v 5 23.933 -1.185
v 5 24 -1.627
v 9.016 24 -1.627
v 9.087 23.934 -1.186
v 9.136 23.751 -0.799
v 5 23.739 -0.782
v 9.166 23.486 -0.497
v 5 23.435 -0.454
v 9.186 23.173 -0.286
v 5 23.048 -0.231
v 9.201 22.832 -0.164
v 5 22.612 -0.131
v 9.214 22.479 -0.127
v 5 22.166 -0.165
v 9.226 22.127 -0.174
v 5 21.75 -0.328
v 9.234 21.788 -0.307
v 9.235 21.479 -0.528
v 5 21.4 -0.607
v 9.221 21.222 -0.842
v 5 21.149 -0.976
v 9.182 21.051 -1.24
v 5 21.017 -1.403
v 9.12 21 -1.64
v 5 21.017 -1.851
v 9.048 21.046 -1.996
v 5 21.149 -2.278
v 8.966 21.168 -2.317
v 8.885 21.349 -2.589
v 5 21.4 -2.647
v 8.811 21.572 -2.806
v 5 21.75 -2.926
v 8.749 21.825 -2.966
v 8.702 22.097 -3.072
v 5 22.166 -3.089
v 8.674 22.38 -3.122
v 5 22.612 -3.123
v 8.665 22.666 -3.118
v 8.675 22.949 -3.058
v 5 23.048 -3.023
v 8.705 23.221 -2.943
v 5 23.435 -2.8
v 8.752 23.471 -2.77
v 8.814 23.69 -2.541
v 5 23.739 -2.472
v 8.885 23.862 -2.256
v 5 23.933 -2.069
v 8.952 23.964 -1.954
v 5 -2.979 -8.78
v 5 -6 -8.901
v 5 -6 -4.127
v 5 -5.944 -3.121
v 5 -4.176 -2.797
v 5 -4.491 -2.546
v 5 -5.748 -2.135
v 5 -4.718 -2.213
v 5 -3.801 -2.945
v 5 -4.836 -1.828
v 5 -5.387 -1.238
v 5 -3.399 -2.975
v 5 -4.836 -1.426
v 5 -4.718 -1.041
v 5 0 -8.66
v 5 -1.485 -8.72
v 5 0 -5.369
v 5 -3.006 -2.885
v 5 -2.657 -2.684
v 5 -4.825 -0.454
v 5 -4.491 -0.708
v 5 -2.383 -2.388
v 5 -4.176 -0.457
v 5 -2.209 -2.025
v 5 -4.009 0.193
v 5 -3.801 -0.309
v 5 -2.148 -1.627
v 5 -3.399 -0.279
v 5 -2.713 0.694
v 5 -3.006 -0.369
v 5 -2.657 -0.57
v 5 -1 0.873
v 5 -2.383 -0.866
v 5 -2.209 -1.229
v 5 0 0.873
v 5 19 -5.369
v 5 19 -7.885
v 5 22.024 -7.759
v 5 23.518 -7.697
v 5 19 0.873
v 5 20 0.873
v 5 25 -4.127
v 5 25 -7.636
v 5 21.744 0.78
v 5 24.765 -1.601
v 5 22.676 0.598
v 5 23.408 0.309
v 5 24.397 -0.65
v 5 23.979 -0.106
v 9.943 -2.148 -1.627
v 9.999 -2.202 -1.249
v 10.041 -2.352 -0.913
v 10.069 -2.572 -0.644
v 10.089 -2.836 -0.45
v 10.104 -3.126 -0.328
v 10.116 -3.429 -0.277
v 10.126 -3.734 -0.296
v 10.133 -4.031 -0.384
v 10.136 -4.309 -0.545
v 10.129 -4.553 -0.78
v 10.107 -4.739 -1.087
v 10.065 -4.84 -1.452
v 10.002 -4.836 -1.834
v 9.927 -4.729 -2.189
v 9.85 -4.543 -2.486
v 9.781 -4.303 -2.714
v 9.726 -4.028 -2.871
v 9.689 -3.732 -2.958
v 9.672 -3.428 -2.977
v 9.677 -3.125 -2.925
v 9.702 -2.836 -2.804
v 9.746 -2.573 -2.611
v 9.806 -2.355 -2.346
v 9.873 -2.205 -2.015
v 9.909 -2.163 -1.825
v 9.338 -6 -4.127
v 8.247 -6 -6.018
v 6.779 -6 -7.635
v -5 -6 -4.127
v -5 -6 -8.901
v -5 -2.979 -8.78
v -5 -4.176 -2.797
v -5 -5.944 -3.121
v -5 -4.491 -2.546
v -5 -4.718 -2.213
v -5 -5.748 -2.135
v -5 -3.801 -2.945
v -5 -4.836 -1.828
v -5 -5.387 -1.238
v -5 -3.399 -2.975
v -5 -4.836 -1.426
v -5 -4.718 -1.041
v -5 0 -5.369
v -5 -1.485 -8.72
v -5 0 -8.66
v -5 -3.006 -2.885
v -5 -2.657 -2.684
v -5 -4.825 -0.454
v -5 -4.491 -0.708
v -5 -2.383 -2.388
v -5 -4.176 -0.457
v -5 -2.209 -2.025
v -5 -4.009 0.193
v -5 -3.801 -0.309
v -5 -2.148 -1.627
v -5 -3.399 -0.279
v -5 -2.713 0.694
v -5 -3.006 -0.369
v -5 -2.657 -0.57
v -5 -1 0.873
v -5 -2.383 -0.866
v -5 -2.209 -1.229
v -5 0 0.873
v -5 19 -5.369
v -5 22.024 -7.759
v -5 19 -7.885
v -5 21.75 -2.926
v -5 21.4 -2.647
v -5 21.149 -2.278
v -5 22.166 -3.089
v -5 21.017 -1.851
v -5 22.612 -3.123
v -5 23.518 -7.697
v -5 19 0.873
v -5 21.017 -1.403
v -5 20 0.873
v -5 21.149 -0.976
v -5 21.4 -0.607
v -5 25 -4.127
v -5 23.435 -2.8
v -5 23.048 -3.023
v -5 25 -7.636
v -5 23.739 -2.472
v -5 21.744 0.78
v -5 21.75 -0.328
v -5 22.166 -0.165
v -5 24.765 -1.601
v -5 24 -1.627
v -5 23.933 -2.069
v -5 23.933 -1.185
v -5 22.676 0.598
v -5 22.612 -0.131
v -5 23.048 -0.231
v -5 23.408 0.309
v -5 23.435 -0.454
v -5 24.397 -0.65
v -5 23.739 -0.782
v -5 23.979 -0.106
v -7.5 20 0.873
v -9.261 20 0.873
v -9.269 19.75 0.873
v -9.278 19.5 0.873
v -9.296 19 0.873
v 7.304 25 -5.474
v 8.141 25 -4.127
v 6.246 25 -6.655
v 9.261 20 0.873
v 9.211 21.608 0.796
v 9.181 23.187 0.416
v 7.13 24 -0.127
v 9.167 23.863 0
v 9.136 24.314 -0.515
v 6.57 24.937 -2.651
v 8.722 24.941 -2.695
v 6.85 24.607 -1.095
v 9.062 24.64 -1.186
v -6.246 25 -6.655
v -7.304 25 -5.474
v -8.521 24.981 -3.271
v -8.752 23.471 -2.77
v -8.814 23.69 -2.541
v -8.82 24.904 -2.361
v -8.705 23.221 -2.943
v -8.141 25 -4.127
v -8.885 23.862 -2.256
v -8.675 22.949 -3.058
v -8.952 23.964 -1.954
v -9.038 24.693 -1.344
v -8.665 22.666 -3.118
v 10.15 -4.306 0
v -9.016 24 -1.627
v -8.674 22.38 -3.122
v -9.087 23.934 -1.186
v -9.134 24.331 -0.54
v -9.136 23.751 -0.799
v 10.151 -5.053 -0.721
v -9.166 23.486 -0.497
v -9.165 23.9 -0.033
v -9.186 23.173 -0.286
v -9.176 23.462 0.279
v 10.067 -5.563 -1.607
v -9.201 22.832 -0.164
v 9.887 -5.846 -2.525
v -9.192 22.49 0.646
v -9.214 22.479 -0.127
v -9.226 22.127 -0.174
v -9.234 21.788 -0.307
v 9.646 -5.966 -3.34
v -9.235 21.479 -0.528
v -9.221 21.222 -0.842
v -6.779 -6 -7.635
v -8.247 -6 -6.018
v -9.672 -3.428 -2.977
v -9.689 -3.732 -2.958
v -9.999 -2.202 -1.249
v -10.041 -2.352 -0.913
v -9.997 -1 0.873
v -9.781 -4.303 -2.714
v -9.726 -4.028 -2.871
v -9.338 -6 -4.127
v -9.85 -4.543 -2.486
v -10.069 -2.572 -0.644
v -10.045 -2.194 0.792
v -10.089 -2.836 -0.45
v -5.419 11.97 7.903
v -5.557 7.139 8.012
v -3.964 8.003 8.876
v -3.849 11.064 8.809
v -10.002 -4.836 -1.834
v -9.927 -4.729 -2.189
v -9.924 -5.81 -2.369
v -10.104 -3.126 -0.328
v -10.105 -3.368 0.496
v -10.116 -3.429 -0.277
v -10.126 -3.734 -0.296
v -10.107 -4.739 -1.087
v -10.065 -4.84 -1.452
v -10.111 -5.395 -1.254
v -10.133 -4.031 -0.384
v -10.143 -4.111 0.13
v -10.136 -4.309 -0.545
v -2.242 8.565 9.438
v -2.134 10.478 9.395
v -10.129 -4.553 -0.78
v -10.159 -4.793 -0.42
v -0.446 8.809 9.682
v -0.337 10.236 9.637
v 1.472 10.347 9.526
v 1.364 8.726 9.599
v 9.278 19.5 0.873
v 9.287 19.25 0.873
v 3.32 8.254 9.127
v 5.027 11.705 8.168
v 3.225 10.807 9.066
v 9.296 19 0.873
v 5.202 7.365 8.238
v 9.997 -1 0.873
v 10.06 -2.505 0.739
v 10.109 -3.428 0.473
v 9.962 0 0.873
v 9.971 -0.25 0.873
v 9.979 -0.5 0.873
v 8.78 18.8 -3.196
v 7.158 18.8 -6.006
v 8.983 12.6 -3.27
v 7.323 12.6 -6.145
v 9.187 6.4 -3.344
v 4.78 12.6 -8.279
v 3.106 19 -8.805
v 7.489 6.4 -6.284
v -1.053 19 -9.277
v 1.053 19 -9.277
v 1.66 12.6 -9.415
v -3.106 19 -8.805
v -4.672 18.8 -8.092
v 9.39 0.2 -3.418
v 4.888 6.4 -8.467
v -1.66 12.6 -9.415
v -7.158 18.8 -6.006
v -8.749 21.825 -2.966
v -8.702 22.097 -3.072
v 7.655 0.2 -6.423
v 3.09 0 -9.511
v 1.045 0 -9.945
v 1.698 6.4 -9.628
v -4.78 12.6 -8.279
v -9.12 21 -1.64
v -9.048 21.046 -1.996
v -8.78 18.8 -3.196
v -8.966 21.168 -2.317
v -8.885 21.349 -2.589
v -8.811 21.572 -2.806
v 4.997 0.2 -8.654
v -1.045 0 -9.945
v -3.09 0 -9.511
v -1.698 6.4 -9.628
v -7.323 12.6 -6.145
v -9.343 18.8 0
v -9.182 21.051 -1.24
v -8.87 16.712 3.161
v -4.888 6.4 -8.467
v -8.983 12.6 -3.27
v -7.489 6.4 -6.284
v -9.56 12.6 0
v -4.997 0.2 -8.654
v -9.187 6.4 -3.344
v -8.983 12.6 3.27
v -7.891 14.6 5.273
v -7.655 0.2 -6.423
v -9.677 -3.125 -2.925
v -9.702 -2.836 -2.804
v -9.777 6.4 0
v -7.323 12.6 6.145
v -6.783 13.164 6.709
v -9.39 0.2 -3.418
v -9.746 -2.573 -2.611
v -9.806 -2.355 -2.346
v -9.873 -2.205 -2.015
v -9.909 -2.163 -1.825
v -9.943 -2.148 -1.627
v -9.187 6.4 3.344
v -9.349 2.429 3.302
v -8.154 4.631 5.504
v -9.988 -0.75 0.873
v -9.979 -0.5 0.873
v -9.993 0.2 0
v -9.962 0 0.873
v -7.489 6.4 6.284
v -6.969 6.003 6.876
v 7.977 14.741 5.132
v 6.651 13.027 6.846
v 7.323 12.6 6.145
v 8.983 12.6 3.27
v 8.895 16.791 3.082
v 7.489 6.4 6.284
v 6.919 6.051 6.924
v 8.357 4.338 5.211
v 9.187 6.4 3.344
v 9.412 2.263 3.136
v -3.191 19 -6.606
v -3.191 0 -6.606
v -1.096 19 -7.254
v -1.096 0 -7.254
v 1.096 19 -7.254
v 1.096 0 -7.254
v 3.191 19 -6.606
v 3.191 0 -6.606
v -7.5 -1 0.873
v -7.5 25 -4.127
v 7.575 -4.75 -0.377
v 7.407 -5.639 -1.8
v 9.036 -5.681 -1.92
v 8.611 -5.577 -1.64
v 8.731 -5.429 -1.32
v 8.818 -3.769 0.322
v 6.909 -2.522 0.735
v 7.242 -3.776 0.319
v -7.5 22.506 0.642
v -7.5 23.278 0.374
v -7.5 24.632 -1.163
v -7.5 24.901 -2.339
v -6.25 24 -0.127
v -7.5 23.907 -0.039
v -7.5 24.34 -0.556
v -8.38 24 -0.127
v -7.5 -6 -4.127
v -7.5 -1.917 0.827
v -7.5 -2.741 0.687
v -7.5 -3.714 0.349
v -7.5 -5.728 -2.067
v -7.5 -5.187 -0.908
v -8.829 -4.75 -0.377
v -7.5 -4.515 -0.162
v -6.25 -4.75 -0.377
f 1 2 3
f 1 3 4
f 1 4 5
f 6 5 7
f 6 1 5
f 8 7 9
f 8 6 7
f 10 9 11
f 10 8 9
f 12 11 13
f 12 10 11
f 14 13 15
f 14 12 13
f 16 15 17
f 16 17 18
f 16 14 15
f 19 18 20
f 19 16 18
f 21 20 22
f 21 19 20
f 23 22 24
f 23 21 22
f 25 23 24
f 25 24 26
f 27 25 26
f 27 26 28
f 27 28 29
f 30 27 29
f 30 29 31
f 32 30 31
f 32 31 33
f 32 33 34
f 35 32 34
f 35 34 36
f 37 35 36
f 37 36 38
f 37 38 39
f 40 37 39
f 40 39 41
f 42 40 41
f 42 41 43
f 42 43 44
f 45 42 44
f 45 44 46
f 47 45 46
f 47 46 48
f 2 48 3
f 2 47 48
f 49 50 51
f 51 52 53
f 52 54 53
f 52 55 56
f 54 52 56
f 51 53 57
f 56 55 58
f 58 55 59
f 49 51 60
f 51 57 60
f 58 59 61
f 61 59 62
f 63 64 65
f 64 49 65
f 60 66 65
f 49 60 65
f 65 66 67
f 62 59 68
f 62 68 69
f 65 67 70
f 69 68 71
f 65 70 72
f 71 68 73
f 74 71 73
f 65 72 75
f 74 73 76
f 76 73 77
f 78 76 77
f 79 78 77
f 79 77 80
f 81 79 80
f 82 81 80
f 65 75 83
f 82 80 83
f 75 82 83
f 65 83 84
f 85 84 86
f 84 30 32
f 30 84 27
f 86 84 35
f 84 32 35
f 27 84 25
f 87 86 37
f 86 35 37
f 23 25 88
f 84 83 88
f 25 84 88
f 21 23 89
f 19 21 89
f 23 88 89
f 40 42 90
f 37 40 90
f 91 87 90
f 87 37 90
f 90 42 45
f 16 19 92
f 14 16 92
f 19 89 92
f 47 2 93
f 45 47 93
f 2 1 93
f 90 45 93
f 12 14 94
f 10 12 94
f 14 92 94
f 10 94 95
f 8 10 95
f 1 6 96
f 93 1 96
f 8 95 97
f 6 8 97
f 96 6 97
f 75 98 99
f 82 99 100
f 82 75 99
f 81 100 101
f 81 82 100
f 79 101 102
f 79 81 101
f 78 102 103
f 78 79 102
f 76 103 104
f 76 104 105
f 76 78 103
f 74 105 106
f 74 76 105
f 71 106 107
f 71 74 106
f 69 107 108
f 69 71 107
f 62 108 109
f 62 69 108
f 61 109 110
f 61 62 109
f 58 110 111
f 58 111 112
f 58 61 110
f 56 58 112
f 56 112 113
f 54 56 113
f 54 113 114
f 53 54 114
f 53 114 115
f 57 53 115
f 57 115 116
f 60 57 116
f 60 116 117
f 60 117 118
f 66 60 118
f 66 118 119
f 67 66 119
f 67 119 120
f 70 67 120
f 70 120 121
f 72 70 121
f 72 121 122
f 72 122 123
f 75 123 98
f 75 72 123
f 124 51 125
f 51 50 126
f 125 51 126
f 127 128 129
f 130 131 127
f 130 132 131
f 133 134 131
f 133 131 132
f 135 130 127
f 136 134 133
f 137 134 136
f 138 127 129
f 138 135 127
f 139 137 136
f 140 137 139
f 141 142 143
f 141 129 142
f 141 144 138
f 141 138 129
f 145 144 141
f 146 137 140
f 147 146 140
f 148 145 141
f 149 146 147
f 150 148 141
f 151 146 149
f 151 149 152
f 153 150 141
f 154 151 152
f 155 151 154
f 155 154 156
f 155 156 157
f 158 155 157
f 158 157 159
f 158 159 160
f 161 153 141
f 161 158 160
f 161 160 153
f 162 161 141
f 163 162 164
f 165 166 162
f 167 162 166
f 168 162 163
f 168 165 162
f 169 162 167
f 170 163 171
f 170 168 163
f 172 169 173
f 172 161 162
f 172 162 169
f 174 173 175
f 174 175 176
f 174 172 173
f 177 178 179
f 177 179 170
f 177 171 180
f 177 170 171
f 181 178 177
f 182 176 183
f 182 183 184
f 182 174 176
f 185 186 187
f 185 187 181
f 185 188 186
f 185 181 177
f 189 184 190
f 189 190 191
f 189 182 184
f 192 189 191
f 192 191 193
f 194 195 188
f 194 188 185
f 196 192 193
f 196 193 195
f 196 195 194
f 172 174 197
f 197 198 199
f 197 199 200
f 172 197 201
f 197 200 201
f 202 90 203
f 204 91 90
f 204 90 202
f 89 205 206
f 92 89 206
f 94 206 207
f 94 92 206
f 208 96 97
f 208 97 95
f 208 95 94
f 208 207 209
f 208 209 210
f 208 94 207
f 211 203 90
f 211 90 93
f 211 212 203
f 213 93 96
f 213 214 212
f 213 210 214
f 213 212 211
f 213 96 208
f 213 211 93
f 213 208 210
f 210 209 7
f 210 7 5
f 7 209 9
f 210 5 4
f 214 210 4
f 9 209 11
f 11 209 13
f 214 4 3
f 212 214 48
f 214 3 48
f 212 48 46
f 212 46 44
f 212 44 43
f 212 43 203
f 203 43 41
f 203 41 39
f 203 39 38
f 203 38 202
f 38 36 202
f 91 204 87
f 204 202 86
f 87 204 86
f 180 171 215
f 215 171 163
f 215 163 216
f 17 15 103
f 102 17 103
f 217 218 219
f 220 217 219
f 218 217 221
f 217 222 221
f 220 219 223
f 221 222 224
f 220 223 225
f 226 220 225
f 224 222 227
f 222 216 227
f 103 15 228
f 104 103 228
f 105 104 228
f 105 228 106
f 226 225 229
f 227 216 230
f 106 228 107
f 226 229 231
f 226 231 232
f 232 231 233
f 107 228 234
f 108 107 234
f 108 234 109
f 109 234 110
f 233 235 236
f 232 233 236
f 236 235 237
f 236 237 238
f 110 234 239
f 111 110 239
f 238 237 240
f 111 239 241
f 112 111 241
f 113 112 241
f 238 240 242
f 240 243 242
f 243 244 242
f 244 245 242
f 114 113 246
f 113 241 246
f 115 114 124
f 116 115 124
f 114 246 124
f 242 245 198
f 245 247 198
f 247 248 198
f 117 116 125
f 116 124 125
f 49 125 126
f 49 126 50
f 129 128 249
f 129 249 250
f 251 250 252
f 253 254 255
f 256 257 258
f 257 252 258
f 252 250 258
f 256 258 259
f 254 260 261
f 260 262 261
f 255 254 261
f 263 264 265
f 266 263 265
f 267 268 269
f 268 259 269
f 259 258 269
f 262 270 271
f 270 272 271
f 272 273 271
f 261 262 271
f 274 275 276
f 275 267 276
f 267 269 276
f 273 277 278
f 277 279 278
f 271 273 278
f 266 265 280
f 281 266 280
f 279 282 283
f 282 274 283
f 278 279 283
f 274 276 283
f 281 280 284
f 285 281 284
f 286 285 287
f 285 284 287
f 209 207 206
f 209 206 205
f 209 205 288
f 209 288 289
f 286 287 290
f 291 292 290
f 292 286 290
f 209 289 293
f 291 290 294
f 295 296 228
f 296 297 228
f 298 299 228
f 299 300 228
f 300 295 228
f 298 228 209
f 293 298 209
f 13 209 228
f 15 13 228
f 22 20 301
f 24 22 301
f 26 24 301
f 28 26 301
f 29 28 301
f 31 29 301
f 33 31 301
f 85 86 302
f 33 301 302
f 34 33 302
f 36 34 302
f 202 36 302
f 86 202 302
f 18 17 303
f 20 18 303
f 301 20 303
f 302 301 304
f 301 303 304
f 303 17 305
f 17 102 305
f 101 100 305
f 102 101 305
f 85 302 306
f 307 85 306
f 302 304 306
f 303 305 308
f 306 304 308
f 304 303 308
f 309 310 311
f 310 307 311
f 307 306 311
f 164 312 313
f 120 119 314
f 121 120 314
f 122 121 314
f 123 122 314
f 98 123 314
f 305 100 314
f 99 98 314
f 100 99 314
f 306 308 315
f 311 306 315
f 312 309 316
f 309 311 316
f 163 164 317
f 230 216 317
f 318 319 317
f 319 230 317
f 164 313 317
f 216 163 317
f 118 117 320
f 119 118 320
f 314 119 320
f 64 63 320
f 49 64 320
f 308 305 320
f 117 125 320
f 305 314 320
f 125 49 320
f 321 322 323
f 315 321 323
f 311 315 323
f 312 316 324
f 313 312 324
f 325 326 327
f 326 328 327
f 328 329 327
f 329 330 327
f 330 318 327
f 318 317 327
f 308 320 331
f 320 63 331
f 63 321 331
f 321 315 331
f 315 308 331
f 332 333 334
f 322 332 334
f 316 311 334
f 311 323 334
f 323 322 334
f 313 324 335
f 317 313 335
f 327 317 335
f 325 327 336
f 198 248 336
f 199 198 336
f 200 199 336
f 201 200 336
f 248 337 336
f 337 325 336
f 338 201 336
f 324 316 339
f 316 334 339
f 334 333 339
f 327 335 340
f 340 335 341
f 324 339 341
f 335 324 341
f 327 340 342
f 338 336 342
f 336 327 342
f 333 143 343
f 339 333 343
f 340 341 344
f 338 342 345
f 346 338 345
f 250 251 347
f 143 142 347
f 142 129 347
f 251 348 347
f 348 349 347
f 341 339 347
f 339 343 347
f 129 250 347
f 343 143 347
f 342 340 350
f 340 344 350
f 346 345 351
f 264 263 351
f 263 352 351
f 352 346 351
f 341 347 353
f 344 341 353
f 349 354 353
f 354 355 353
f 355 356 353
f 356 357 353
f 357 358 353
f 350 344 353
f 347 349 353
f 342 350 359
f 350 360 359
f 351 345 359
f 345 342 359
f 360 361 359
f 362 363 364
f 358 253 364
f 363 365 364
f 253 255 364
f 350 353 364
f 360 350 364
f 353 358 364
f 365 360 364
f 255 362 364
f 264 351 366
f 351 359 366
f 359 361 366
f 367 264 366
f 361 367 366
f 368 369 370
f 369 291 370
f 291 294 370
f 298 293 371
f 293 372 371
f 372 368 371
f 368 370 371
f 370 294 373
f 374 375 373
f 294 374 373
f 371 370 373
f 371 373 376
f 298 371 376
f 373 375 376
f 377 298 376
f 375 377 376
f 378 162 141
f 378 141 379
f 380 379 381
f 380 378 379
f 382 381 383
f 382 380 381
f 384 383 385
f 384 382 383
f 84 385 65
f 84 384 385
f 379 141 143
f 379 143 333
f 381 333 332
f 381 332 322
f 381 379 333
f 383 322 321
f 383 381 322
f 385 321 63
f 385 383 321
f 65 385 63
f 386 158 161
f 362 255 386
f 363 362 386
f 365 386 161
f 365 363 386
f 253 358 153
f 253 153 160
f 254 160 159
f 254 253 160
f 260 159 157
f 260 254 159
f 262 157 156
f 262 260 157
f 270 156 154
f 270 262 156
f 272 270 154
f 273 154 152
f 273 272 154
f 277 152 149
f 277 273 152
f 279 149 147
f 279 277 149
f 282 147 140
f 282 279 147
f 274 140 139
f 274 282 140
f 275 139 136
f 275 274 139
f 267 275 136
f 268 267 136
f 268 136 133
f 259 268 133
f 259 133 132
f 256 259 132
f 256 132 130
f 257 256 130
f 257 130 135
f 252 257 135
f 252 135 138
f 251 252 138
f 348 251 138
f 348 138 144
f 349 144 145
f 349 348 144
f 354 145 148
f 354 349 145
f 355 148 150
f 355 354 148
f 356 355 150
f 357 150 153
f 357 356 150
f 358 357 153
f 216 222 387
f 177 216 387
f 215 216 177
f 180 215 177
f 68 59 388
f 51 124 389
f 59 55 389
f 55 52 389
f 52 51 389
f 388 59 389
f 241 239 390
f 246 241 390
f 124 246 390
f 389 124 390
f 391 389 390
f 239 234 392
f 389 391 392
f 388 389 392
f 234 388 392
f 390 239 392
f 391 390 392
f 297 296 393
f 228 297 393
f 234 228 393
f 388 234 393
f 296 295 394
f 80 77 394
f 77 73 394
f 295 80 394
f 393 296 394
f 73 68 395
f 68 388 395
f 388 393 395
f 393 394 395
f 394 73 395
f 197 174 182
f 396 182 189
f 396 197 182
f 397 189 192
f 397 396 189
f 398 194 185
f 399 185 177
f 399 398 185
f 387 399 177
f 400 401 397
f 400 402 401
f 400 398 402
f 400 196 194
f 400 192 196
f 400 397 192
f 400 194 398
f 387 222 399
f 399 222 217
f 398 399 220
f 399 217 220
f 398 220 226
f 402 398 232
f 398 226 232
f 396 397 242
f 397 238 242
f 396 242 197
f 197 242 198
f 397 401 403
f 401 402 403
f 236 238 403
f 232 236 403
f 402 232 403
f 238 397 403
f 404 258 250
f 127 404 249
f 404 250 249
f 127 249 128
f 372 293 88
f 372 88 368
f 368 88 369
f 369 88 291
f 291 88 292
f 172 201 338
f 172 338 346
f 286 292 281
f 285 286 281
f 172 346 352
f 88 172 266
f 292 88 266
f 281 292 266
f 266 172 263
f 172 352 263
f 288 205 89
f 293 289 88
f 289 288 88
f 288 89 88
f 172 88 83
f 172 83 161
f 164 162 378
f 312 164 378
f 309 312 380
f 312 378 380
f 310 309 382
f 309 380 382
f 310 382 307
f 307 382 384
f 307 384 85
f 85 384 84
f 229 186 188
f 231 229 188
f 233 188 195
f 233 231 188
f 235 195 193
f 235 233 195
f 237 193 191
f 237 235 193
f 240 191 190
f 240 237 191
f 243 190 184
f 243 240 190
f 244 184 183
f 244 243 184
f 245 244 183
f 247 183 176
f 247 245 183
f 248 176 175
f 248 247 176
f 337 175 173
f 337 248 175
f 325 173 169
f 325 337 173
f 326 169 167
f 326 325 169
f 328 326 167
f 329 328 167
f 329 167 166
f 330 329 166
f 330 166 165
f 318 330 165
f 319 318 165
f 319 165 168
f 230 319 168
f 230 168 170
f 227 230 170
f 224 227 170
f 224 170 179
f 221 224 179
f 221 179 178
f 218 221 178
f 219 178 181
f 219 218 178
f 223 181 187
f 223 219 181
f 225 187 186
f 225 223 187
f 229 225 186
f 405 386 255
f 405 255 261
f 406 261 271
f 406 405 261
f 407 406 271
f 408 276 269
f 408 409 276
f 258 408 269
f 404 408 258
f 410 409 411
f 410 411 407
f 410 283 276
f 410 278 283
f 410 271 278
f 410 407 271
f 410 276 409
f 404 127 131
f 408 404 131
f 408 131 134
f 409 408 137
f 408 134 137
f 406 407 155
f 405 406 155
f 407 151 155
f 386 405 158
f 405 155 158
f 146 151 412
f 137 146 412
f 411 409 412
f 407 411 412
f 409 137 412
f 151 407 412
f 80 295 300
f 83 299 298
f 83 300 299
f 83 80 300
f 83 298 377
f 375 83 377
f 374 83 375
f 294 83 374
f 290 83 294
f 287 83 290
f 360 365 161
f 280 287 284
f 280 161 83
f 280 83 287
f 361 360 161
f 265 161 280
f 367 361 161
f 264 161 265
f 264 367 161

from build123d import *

# Parameters (mm, degrees)
SKETCH1_R                     = 10
BOSS_EXTRUDE1_DEPTH           = 25
BOSS_EXTRUDE1_TAPER           = 2
BOSS_EXTRUDE1_OTHER_WAY_DEPTH = 6
BOSS_EXTRUDE1_OTHER_WAY_TAPER = -2
CUT_EXTRUDE1_DEPTH            = 29.86985947
CUT_EXTRUDE1_DEPTH_BACK       = 29.86985947
SKETCH3_W                     = 10
SKETCH3_H                     = 6
CUT_EXTRUDE2_DEPTH            = 25
CUT_EXTRUDE3_DEPTH            = 31.99296746
CUT_EXTRUDE3_DEPTH_BACK       = 31.99296746
SKETCH4_R                     = 1.5
FILLET2_SIZE                  = 5
CUT_EXTRUDE5_DEPTH            = 29.869859627
CUT_EXTRUDE5_DEPTH_BACK       = 29.869859627
SKETCH8_W                     = 10
SKETCH8_H                     = 6
CUT_EXTRUDE6_DEPTH            = 30.190018507
CUT_EXTRUDE7_DEPTH            = 29.796430368
CUT_EXTRUDE8_DEPTH            = 31.924580015
CUT_EXTRUDE8_DEPTH_BACK       = 31.924580015
SKETCH9_R                     = 1.351518808
FILLET3_SIZE                  = 5


with BuildPart() as part:
    # Sketch1 → Boss-Extrude1 (new body)
    with BuildSketch(Plane(origin=(0, 0, 0), x_dir=(1, 0, 0), z_dir=(0, 1, 0))):
        Circle(SKETCH1_R)
    extrude(amount=BOSS_EXTRUDE1_DEPTH, taper=BOSS_EXTRUDE1_TAPER)

    # Sketch1 → Boss-Extrude1 other way (add)
    with BuildSketch(Plane(origin=(0, 0, 0), x_dir=(1, 0, 0), z_dir=(0, 1, 0))):
        Circle(SKETCH1_R)
    extrude(amount=-BOSS_EXTRUDE1_OTHER_WAY_DEPTH, taper=BOSS_EXTRUDE1_OTHER_WAY_TAPER)

    # Sketch2 → Cut-Extrude1 (cut, two sides: drawn at the far end of the back side and taken through both)
    with BuildSketch(Plane(origin=(0, 0, 0), x_dir=(0, 0, -1), z_dir=(1, 0, 0)).offset(-CUT_EXTRUDE1_DEPTH_BACK)):
        Polygon((-0.873019237, 25), (-0.873019237, 19), (-12.898136563, 6.974882674), (-12.898136563, 25), align=None)
    extrude(amount=CUT_EXTRUDE1_DEPTH + CUT_EXTRUDE1_DEPTH_BACK, mode=Mode.SUBTRACT)

    # Sketch3 → Cut-Extrude2 (cut)
    with BuildSketch(Plane.XY.offset(0.873019237)):
        with Locations((0, 22)):
            Rectangle(SKETCH3_W, SKETCH3_H)
    extrude(amount=-CUT_EXTRUDE2_DEPTH, mode=Mode.SUBTRACT)

    # Sketch4 → Cut-Extrude3 (cut, two sides: drawn at the far end of the back side and taken through both)
    with BuildSketch(Plane(origin=(-5, 0, 0), x_dir=(0, 0, -1), z_dir=(1, 0, 0)).offset(-CUT_EXTRUDE3_DEPTH_BACK)):
        with Locations(Location((1.626980763, 22.5, 0), (0, 0, 90))):
            Circle(SKETCH4_R)
    extrude(amount=CUT_EXTRUDE3_DEPTH + CUT_EXTRUDE3_DEPTH_BACK, mode=Mode.SUBTRACT)

    # Fillet2
    # a fillet whose section is not a circle: 5 mm, written as the material it takes off along each edge
    with BuildSketch(Plane(origin=(-7.5, 25, 0.873019237), x_dir=(0, -1, 0), z_dir=(1, 0, 0))) as fillet2_piece_1:
        with BuildLine():
            Bezier((FILLET2_SIZE, 0), (0, 0), (0, FILLET2_SIZE), weights=[1, 1.5, 1])
            Line((0, FILLET2_SIZE), (0, 0))
            Line((0, 0), (FILLET2_SIZE, 0))
        make_face()
    extrude(amount=29.085131549, mode=Mode.SUBTRACT)
    with BuildSketch(Plane(origin=(-21.585131549, 25, 0.873019237), x_dir=(0, 0, -1), z_dir=(1, 0, 0))) as fillet2_piece_2:
        with BuildLine():
            Bezier((FILLET2_SIZE, 0), (0, 0), (0, -FILLET2_SIZE), weights=[1, 1.5, 1])
            Line((0, -FILLET2_SIZE), (0, 0))
            Line((0, 0), (FILLET2_SIZE, 0))
        make_face()
    extrude(amount=29.085131549, mode=Mode.SUBTRACT)

    # Sketch7 → Cut-Extrude5 (cut, two sides: drawn at the far end of the back side and taken through both)
    with BuildSketch(Plane(origin=(0, 0, 0), x_dir=(0, 0, -1), z_dir=(1, 0, 0)).offset(-CUT_EXTRUDE5_DEPTH_BACK)):
        Polygon((-0.873019237, -6), (-0.873019237, 0), (-11.31781305, 10.444793812), (-11.31781305, -6), align=None)
    extrude(amount=CUT_EXTRUDE5_DEPTH + CUT_EXTRUDE5_DEPTH_BACK, mode=Mode.SUBTRACT)

    # Sketch8 → Cut-Extrude6 (cut, through all)
    with BuildSketch(Plane.XY.offset(0.873019237)):
        with Locations((0, -3)):
            Rectangle(SKETCH8_W, SKETCH8_H)
    extrude(amount=-CUT_EXTRUDE6_DEPTH, mode=Mode.SUBTRACT)

    # Sketch6 → Cut-Extrude7 (cut, through all)
    with BuildSketch(Plane(origin=(0, 19, 0), x_dir=(1, 0, 0), z_dir=(0, 1, 0))):
        with BuildLine():
            Line((5, 5.368827729), (5, -0.873019237))
            Line((5, -0.873019237), (-5, -0.873019237))
            Line((-5, -0.873019237), (-5, 5.368827729))
            ThreePointArc((-5, 5.368827729), (0, 7.33650538), (5, 5.368827729))
        make_face()
    extrude(amount=-CUT_EXTRUDE7_DEPTH, mode=Mode.SUBTRACT)

    # Sketch9 → Cut-Extrude8 (cut, two sides: drawn at the far end of the back side and taken through both)
    with BuildSketch(Plane(origin=(-5, 0, 0), x_dir=(0, 0, -1), z_dir=(1, 0, 0)).offset(-CUT_EXTRUDE8_DEPTH_BACK)):
        with Locations(Location((1.626980763, -3.5, 0), (0, 0, 90))):
            Circle(SKETCH9_R)
    extrude(amount=CUT_EXTRUDE8_DEPTH + CUT_EXTRUDE8_DEPTH_BACK, mode=Mode.SUBTRACT)

    # Fillet3
    # a fillet whose section is not a circle: 5 mm, written as the material it takes off along each edge
    with BuildSketch(Plane(origin=(22.672130078, -6, 0.873019237), x_dir=(0, 0, -1), z_dir=(-1, 0, 0))) as fillet3_piece_1:
        with BuildLine():
            Bezier((FILLET3_SIZE, 0), (0, 0), (0, -FILLET3_SIZE), weights=[1, 1, 1])
            Line((0, -FILLET3_SIZE), (0, 0))
            Line((0, 0), (FILLET3_SIZE, 0))
        make_face()
    extrude(amount=30.172130078, mode=Mode.SUBTRACT)
    with BuildSketch(Plane(origin=(7.5, -6, 0.873019237), x_dir=(0, 1, 0), z_dir=(-1, 0, 0))) as fillet3_piece_2:
        with BuildLine():
            Bezier((FILLET3_SIZE, 0), (0, 0), (0, FILLET3_SIZE), weights=[1, 1, 1])
            Line((0, FILLET3_SIZE), (0, 0))
            Line((0, 0), (FILLET3_SIZE, 0))
        make_face()
    extrude(amount=30.172130078, mode=Mode.SUBTRACT)


solid = part.part
